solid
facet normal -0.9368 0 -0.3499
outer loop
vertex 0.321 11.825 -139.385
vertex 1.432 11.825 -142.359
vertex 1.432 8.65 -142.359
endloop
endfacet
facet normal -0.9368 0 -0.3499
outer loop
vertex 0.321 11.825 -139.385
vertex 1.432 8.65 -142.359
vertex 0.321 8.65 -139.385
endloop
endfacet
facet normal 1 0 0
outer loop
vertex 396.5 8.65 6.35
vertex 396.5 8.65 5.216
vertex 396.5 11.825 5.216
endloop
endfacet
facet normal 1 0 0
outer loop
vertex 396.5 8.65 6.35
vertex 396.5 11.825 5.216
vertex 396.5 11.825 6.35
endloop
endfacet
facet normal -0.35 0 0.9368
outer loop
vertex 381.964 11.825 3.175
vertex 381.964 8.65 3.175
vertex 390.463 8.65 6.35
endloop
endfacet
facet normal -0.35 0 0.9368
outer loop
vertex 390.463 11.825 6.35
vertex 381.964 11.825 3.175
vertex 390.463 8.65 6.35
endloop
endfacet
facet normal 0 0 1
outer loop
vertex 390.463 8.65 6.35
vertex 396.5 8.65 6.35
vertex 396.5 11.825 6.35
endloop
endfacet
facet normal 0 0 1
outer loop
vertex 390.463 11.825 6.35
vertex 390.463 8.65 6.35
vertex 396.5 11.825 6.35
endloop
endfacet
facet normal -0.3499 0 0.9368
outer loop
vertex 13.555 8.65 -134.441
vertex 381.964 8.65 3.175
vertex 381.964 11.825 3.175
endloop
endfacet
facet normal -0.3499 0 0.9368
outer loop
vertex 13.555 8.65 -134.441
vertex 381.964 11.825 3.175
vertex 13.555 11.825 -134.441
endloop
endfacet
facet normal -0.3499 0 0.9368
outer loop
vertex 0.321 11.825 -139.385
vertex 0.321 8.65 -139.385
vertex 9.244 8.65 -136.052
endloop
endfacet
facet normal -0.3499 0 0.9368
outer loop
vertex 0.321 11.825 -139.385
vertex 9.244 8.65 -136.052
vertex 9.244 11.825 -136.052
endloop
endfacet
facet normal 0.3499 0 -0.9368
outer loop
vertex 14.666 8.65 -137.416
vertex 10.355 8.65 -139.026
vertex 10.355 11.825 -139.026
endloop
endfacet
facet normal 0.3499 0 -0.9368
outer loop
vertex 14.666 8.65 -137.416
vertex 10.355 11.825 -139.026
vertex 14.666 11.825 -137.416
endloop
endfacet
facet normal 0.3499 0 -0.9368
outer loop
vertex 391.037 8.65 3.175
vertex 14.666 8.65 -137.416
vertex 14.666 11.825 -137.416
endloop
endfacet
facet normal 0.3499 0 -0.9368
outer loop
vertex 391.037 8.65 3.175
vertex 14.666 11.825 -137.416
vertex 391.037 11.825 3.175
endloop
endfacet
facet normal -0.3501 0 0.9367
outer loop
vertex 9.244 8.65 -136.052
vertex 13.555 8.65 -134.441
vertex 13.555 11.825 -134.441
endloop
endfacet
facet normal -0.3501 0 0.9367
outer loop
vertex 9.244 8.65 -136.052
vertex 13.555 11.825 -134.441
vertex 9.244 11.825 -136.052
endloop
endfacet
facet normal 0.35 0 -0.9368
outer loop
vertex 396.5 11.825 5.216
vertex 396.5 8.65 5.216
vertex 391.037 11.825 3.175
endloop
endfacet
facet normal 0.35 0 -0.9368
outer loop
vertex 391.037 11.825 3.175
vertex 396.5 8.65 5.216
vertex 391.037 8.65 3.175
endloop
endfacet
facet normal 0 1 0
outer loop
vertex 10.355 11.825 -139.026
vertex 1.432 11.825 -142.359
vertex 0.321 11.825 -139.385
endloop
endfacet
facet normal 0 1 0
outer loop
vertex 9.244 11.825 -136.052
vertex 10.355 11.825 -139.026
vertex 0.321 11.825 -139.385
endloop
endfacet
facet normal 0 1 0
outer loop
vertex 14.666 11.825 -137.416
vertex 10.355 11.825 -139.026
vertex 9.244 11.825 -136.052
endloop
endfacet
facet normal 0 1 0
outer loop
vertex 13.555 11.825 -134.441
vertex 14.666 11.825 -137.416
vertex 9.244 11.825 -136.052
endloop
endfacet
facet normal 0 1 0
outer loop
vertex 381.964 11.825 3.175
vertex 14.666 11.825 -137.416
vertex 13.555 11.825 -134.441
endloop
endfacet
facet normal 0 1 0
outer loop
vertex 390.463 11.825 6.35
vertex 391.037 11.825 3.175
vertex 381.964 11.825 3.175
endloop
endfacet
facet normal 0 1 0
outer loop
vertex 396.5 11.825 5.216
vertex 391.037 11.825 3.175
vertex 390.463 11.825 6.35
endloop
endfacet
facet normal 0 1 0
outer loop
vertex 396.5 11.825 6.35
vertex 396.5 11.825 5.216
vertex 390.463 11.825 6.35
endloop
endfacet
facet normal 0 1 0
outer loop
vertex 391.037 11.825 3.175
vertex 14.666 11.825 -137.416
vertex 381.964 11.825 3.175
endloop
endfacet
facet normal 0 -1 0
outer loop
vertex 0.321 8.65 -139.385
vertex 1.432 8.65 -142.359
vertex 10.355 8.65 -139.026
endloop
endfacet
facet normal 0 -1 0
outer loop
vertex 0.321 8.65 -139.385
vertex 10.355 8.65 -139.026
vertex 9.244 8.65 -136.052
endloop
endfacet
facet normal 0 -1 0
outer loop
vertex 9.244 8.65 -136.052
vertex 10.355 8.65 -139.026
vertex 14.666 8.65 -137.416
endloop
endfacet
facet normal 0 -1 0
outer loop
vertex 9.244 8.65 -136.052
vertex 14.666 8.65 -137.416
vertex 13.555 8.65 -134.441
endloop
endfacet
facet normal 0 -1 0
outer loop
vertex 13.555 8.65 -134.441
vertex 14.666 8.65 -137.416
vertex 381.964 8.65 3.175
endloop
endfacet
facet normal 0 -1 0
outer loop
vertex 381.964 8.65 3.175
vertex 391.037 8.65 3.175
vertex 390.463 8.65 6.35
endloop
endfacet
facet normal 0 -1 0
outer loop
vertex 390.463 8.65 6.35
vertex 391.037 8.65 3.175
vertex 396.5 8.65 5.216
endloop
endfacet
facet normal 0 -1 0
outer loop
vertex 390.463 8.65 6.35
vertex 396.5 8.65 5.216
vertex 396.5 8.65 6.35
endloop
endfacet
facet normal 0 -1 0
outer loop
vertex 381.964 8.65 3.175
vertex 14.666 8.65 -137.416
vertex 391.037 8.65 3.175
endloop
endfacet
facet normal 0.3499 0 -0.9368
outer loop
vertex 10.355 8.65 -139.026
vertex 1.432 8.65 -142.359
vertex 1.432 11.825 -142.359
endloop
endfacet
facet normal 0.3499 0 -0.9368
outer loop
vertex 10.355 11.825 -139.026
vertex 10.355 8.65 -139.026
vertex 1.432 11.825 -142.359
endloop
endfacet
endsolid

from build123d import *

# Parameters (mm, degrees)
BOSS_EXTRUDE1_DEPTH   = 3.175
BOSS_EXTRUDE1_2_DEPTH = 3.175
SKETCH2_W             = 3.175
SKETCH2_H             = 36.35
BOSS_EXTRUDE2_DEPTH   = 3.175
SKETCH3_W             = 3.175
SKETCH3_H             = 3.175
BOSS_EXTRUDE8_DEPTH   = 423.175
BOSS_EXTRUDE8_2_DEPTH = 423.175
SKETCH4_W             = 3.175
SKETCH4_H             = 36.35
CUT_EXTRUDE1_DEPTH    = 427.326430831
CUT_EXTRUDE5_DEPTH    = 408.294257878
BOSS_EXTRUDE9_DEPTH   = 3.175
SKETCH8_R             = 22.246551504
CUT_EXTRUDE6_DEPTH    = 30
SKETCH9_W             = 3.175
SKETCH9_H             = 3.175
BOSS_EXTRUDE10_DEPTH  = 9.525
SKETCH10_W            = 3.036361865
SKETCH10_H            = 1.134211297
CUT_EXTRUDE7_DEPTH    = 10


with BuildPart() as part:
    # Sketch1 → Boss-Extrude1 (new body)
    with BuildSketch(Plane.XY):
        Polygon((15, 45), (405, 45), (405, 48.175), (18.175, 48.175), (-18.175, 48.175), (-18.175, 45), (-15, 45), align=None)
    extrude(amount=BOSS_EXTRUDE1_DEPTH)



with BuildPart() as body_2:
    # Sketch1 → Boss-Extrude1 2 (new body)
    with BuildSketch(Plane.XY):
        Polygon((-18.175, 15), (-15, 15), (15, 15), (405, 15), (405, 11.825), (18.175, 11.825), (-18.175, 11.825), align=None)
    extrude(amount=BOSS_EXTRUDE1_2_DEPTH)


with BuildPart() as part_1:
    add(part.part)

    add(body_2.part)  # Boss-Extrude2 merges body 2
    # Sketch2 → Boss-Extrude2 (add)
    with BuildSketch(Plane.XY.offset(3.175)):
        with Locations((-16.5875, 30)):
            Rectangle(SKETCH2_W, SKETCH2_H)
        Polygon((15, 11.825), (22.589723325, 11.825), (112.5, 46.473699254), (112.5, 12.285600704), (112.5, 11.825), (120.025102002, 11.825), (208.4125, 46.469905429), (208.4125, 11.825), (215.937602002, 11.825), (304.325, 46.469905429), (304.325, 11.825), (311.914723325, 11.825), (401.825, 46.473699254), (401.825, 11.825), (405, 11.825), (405, 48.175), (397.410276675, 48.175), (307.5, 13.526300746), (307.5, 48.175), (299.974897998, 48.175), (211.5875, 13.530094571), (211.5875, 48.175), (204.062397998, 48.175), (115.675, 13.530094571), (115.675, 48.175), (108.085276675, 48.175), (18.175, 13.526300746), (18.175, 48.175), (15, 48.175), align=None)
    extrude(amount=BOSS_EXTRUDE2_DEPTH)

    # Sketch4 → Cut-Extrude1 (cut, through all)
    with BuildSketch(Plane(origin=(405, 0, 0), x_dir=(0, 0, -1), z_dir=(1, 0, 0))):
        with Locations((-1.5875, 30)):
            Rectangle(SKETCH4_W, SKETCH4_H)
    extrude(amount=-CUT_EXTRUDE1_DEPTH, mode=Mode.SUBTRACT)


with BuildPart() as body_2_2:
    # Sketch3 → Boss-Extrude8 (new body)
    with BuildSketch(Plane(origin=(405, 0, 0), x_dir=(0, 0, -1), z_dir=(1, 0, 0))):
        with Locations((-4.7625, 49.7625)):
            Rectangle(SKETCH3_W, SKETCH3_H)
    extrude(amount=-BOSS_EXTRUDE8_DEPTH)


with BuildPart() as body_3:
    # Sketch3 → Boss-Extrude8 2 (new body)
    with BuildSketch(Plane(origin=(405, 0, 0), x_dir=(0, 0, -1), z_dir=(1, 0, 0))):
        with Locations((-4.7625, 10.2375)):
            Rectangle(SKETCH3_W, SKETCH3_H)
    extrude(amount=-BOSS_EXTRUDE8_2_DEPTH)


with BuildPart() as cut_extrude1_piece_1:
    # of the separate pieces the step leaves, piece 1, a body of its own (cut_extrude1_pieces)
    add(part_1.part.solids().sort_by_distance((401.825, 11.825, 3.175))[0])


with BuildPart() as cut_extrude1_piece_2:
    # of the separate pieces the step leaves, piece 2, a body of its own (cut_extrude1_pieces)
    add(part_1.part.solids().sort_by_distance((-15, 48.175, 3.175))[0])


with BuildPart() as cut_extrude5_tool:
    # Sketch5 → Cut-Extrude5 (new, through all)
    with BuildSketch(Plane.XZ.offset(-8.65)):
        Polygon((-18.175, 6.35), (-18.175, 3.175), (381.963638135, 3.175), (390.463332101, 6.35), align=None)
        Polygon((405, 6.35), (399.536667899, 6.35), (391.036973934, 3.175), (405, 3.175), align=None)
    extrude(amount=-CUT_EXTRUDE5_DEPTH)


with BuildPart() as body_2_2_1:
    add(body_2_2.part)

    # Cut-Extrude5: cut by cut_extrude5_tool
    add(cut_extrude5_tool.part, mode=Mode.SUBTRACT)


with BuildPart() as body_3_1:
    add(body_3.part)

    # Cut-Extrude5: cut by cut_extrude5_tool
    add(cut_extrude5_tool.part, mode=Mode.SUBTRACT)

    # Sketch5<3> → Boss-Extrude9 (add)
    with BuildSketch(Plane.XZ.offset(-8.65)):
        with BuildLine():
            Line((391.036973934, 3.175), (381.963638135, 3.175))
            Line((381.963638135, 3.175), (13.554929678, -134.441442909))
            ThreePointArc((13.554929678, -134.441442909), (14.260668904, -135.872458965), (14.665946091, -137.415710471))
            Line((14.665946091, -137.415710471), (391.036973934, 3.175))
        make_face()
        with BuildLine():
            ThreePointArc((14.665946091, -137.415710471), (14.260668904, -135.872458965), (13.554929678, -134.441442909))
            Line((13.554929678, -134.441442909), (9.243759355, -136.051849805))
            Line((9.243759355, -136.051849805), (10.354775769, -139.026117367))
            Line((10.354775769, -139.026117367), (14.665946091, -137.415710471))
        make_face()
    extrude(amount=-BOSS_EXTRUDE9_DEPTH)

    # Sketch9 → Boss-Extrude10 (add)
    with BuildSketch(Plane(origin=(-36.486342691, 0, -13.62921283), x_dir=(-0.34992642955188064, 0, 0.93677718476758), z_dir=(-0.93677718476758, 0, -0.34992642955188064))):
        with Locations((-132.27240455, 10.2375)):
            Rectangle(SKETCH9_W, SKETCH9_H)
    extrude(amount=BOSS_EXTRUDE10_DEPTH)

    # Sketch10 → Cut-Extrude7 (cut)
    with BuildSketch(Plane.XZ.offset(-8.65)):
        with Locations((398.018486967, 5.782894352)):
            Rectangle(SKETCH10_W, SKETCH10_H)
    extrude(amount=-CUT_EXTRUDE7_DEPTH, mode=Mode.SUBTRACT)


with BuildPart() as cut_extrude1_piece_1_1:
    add(cut_extrude1_piece_1.part)

    # Cut-Extrude5: cut by cut_extrude5_tool
    add(cut_extrude5_tool.part, mode=Mode.SUBTRACT)


with BuildPart() as cut_extrude1_piece_2_1:
    add(cut_extrude1_piece_2.part)

    # Cut-Extrude5: cut by cut_extrude5_tool
    add(cut_extrude5_tool.part, mode=Mode.SUBTRACT)


with BuildPart() as cut_extrude6_tool:
    # Sketch8 → Cut-Extrude6 (new body)
    with BuildSketch(Plane(origin=(0, 51.35, 0), x_dir=(1, 0, 0), z_dir=(0, 1, 0))):
        with Locations((390.031158892, -4.957539076)):
            Circle(SKETCH8_R)
    extrude(amount=-CUT_EXTRUDE6_DEPTH)


with BuildPart() as body_2_2_2:
    add(body_2_2_1.part)

    # Cut-Extrude6: cut by cut_extrude6_tool
    add(cut_extrude6_tool.part, mode=Mode.SUBTRACT)


with BuildPart() as cut_extrude1_piece_1_2:
    add(cut_extrude1_piece_1_1.part)

    # Cut-Extrude6: cut by cut_extrude6_tool
    add(cut_extrude6_tool.part, mode=Mode.SUBTRACT)


solid = body_3_1.part
